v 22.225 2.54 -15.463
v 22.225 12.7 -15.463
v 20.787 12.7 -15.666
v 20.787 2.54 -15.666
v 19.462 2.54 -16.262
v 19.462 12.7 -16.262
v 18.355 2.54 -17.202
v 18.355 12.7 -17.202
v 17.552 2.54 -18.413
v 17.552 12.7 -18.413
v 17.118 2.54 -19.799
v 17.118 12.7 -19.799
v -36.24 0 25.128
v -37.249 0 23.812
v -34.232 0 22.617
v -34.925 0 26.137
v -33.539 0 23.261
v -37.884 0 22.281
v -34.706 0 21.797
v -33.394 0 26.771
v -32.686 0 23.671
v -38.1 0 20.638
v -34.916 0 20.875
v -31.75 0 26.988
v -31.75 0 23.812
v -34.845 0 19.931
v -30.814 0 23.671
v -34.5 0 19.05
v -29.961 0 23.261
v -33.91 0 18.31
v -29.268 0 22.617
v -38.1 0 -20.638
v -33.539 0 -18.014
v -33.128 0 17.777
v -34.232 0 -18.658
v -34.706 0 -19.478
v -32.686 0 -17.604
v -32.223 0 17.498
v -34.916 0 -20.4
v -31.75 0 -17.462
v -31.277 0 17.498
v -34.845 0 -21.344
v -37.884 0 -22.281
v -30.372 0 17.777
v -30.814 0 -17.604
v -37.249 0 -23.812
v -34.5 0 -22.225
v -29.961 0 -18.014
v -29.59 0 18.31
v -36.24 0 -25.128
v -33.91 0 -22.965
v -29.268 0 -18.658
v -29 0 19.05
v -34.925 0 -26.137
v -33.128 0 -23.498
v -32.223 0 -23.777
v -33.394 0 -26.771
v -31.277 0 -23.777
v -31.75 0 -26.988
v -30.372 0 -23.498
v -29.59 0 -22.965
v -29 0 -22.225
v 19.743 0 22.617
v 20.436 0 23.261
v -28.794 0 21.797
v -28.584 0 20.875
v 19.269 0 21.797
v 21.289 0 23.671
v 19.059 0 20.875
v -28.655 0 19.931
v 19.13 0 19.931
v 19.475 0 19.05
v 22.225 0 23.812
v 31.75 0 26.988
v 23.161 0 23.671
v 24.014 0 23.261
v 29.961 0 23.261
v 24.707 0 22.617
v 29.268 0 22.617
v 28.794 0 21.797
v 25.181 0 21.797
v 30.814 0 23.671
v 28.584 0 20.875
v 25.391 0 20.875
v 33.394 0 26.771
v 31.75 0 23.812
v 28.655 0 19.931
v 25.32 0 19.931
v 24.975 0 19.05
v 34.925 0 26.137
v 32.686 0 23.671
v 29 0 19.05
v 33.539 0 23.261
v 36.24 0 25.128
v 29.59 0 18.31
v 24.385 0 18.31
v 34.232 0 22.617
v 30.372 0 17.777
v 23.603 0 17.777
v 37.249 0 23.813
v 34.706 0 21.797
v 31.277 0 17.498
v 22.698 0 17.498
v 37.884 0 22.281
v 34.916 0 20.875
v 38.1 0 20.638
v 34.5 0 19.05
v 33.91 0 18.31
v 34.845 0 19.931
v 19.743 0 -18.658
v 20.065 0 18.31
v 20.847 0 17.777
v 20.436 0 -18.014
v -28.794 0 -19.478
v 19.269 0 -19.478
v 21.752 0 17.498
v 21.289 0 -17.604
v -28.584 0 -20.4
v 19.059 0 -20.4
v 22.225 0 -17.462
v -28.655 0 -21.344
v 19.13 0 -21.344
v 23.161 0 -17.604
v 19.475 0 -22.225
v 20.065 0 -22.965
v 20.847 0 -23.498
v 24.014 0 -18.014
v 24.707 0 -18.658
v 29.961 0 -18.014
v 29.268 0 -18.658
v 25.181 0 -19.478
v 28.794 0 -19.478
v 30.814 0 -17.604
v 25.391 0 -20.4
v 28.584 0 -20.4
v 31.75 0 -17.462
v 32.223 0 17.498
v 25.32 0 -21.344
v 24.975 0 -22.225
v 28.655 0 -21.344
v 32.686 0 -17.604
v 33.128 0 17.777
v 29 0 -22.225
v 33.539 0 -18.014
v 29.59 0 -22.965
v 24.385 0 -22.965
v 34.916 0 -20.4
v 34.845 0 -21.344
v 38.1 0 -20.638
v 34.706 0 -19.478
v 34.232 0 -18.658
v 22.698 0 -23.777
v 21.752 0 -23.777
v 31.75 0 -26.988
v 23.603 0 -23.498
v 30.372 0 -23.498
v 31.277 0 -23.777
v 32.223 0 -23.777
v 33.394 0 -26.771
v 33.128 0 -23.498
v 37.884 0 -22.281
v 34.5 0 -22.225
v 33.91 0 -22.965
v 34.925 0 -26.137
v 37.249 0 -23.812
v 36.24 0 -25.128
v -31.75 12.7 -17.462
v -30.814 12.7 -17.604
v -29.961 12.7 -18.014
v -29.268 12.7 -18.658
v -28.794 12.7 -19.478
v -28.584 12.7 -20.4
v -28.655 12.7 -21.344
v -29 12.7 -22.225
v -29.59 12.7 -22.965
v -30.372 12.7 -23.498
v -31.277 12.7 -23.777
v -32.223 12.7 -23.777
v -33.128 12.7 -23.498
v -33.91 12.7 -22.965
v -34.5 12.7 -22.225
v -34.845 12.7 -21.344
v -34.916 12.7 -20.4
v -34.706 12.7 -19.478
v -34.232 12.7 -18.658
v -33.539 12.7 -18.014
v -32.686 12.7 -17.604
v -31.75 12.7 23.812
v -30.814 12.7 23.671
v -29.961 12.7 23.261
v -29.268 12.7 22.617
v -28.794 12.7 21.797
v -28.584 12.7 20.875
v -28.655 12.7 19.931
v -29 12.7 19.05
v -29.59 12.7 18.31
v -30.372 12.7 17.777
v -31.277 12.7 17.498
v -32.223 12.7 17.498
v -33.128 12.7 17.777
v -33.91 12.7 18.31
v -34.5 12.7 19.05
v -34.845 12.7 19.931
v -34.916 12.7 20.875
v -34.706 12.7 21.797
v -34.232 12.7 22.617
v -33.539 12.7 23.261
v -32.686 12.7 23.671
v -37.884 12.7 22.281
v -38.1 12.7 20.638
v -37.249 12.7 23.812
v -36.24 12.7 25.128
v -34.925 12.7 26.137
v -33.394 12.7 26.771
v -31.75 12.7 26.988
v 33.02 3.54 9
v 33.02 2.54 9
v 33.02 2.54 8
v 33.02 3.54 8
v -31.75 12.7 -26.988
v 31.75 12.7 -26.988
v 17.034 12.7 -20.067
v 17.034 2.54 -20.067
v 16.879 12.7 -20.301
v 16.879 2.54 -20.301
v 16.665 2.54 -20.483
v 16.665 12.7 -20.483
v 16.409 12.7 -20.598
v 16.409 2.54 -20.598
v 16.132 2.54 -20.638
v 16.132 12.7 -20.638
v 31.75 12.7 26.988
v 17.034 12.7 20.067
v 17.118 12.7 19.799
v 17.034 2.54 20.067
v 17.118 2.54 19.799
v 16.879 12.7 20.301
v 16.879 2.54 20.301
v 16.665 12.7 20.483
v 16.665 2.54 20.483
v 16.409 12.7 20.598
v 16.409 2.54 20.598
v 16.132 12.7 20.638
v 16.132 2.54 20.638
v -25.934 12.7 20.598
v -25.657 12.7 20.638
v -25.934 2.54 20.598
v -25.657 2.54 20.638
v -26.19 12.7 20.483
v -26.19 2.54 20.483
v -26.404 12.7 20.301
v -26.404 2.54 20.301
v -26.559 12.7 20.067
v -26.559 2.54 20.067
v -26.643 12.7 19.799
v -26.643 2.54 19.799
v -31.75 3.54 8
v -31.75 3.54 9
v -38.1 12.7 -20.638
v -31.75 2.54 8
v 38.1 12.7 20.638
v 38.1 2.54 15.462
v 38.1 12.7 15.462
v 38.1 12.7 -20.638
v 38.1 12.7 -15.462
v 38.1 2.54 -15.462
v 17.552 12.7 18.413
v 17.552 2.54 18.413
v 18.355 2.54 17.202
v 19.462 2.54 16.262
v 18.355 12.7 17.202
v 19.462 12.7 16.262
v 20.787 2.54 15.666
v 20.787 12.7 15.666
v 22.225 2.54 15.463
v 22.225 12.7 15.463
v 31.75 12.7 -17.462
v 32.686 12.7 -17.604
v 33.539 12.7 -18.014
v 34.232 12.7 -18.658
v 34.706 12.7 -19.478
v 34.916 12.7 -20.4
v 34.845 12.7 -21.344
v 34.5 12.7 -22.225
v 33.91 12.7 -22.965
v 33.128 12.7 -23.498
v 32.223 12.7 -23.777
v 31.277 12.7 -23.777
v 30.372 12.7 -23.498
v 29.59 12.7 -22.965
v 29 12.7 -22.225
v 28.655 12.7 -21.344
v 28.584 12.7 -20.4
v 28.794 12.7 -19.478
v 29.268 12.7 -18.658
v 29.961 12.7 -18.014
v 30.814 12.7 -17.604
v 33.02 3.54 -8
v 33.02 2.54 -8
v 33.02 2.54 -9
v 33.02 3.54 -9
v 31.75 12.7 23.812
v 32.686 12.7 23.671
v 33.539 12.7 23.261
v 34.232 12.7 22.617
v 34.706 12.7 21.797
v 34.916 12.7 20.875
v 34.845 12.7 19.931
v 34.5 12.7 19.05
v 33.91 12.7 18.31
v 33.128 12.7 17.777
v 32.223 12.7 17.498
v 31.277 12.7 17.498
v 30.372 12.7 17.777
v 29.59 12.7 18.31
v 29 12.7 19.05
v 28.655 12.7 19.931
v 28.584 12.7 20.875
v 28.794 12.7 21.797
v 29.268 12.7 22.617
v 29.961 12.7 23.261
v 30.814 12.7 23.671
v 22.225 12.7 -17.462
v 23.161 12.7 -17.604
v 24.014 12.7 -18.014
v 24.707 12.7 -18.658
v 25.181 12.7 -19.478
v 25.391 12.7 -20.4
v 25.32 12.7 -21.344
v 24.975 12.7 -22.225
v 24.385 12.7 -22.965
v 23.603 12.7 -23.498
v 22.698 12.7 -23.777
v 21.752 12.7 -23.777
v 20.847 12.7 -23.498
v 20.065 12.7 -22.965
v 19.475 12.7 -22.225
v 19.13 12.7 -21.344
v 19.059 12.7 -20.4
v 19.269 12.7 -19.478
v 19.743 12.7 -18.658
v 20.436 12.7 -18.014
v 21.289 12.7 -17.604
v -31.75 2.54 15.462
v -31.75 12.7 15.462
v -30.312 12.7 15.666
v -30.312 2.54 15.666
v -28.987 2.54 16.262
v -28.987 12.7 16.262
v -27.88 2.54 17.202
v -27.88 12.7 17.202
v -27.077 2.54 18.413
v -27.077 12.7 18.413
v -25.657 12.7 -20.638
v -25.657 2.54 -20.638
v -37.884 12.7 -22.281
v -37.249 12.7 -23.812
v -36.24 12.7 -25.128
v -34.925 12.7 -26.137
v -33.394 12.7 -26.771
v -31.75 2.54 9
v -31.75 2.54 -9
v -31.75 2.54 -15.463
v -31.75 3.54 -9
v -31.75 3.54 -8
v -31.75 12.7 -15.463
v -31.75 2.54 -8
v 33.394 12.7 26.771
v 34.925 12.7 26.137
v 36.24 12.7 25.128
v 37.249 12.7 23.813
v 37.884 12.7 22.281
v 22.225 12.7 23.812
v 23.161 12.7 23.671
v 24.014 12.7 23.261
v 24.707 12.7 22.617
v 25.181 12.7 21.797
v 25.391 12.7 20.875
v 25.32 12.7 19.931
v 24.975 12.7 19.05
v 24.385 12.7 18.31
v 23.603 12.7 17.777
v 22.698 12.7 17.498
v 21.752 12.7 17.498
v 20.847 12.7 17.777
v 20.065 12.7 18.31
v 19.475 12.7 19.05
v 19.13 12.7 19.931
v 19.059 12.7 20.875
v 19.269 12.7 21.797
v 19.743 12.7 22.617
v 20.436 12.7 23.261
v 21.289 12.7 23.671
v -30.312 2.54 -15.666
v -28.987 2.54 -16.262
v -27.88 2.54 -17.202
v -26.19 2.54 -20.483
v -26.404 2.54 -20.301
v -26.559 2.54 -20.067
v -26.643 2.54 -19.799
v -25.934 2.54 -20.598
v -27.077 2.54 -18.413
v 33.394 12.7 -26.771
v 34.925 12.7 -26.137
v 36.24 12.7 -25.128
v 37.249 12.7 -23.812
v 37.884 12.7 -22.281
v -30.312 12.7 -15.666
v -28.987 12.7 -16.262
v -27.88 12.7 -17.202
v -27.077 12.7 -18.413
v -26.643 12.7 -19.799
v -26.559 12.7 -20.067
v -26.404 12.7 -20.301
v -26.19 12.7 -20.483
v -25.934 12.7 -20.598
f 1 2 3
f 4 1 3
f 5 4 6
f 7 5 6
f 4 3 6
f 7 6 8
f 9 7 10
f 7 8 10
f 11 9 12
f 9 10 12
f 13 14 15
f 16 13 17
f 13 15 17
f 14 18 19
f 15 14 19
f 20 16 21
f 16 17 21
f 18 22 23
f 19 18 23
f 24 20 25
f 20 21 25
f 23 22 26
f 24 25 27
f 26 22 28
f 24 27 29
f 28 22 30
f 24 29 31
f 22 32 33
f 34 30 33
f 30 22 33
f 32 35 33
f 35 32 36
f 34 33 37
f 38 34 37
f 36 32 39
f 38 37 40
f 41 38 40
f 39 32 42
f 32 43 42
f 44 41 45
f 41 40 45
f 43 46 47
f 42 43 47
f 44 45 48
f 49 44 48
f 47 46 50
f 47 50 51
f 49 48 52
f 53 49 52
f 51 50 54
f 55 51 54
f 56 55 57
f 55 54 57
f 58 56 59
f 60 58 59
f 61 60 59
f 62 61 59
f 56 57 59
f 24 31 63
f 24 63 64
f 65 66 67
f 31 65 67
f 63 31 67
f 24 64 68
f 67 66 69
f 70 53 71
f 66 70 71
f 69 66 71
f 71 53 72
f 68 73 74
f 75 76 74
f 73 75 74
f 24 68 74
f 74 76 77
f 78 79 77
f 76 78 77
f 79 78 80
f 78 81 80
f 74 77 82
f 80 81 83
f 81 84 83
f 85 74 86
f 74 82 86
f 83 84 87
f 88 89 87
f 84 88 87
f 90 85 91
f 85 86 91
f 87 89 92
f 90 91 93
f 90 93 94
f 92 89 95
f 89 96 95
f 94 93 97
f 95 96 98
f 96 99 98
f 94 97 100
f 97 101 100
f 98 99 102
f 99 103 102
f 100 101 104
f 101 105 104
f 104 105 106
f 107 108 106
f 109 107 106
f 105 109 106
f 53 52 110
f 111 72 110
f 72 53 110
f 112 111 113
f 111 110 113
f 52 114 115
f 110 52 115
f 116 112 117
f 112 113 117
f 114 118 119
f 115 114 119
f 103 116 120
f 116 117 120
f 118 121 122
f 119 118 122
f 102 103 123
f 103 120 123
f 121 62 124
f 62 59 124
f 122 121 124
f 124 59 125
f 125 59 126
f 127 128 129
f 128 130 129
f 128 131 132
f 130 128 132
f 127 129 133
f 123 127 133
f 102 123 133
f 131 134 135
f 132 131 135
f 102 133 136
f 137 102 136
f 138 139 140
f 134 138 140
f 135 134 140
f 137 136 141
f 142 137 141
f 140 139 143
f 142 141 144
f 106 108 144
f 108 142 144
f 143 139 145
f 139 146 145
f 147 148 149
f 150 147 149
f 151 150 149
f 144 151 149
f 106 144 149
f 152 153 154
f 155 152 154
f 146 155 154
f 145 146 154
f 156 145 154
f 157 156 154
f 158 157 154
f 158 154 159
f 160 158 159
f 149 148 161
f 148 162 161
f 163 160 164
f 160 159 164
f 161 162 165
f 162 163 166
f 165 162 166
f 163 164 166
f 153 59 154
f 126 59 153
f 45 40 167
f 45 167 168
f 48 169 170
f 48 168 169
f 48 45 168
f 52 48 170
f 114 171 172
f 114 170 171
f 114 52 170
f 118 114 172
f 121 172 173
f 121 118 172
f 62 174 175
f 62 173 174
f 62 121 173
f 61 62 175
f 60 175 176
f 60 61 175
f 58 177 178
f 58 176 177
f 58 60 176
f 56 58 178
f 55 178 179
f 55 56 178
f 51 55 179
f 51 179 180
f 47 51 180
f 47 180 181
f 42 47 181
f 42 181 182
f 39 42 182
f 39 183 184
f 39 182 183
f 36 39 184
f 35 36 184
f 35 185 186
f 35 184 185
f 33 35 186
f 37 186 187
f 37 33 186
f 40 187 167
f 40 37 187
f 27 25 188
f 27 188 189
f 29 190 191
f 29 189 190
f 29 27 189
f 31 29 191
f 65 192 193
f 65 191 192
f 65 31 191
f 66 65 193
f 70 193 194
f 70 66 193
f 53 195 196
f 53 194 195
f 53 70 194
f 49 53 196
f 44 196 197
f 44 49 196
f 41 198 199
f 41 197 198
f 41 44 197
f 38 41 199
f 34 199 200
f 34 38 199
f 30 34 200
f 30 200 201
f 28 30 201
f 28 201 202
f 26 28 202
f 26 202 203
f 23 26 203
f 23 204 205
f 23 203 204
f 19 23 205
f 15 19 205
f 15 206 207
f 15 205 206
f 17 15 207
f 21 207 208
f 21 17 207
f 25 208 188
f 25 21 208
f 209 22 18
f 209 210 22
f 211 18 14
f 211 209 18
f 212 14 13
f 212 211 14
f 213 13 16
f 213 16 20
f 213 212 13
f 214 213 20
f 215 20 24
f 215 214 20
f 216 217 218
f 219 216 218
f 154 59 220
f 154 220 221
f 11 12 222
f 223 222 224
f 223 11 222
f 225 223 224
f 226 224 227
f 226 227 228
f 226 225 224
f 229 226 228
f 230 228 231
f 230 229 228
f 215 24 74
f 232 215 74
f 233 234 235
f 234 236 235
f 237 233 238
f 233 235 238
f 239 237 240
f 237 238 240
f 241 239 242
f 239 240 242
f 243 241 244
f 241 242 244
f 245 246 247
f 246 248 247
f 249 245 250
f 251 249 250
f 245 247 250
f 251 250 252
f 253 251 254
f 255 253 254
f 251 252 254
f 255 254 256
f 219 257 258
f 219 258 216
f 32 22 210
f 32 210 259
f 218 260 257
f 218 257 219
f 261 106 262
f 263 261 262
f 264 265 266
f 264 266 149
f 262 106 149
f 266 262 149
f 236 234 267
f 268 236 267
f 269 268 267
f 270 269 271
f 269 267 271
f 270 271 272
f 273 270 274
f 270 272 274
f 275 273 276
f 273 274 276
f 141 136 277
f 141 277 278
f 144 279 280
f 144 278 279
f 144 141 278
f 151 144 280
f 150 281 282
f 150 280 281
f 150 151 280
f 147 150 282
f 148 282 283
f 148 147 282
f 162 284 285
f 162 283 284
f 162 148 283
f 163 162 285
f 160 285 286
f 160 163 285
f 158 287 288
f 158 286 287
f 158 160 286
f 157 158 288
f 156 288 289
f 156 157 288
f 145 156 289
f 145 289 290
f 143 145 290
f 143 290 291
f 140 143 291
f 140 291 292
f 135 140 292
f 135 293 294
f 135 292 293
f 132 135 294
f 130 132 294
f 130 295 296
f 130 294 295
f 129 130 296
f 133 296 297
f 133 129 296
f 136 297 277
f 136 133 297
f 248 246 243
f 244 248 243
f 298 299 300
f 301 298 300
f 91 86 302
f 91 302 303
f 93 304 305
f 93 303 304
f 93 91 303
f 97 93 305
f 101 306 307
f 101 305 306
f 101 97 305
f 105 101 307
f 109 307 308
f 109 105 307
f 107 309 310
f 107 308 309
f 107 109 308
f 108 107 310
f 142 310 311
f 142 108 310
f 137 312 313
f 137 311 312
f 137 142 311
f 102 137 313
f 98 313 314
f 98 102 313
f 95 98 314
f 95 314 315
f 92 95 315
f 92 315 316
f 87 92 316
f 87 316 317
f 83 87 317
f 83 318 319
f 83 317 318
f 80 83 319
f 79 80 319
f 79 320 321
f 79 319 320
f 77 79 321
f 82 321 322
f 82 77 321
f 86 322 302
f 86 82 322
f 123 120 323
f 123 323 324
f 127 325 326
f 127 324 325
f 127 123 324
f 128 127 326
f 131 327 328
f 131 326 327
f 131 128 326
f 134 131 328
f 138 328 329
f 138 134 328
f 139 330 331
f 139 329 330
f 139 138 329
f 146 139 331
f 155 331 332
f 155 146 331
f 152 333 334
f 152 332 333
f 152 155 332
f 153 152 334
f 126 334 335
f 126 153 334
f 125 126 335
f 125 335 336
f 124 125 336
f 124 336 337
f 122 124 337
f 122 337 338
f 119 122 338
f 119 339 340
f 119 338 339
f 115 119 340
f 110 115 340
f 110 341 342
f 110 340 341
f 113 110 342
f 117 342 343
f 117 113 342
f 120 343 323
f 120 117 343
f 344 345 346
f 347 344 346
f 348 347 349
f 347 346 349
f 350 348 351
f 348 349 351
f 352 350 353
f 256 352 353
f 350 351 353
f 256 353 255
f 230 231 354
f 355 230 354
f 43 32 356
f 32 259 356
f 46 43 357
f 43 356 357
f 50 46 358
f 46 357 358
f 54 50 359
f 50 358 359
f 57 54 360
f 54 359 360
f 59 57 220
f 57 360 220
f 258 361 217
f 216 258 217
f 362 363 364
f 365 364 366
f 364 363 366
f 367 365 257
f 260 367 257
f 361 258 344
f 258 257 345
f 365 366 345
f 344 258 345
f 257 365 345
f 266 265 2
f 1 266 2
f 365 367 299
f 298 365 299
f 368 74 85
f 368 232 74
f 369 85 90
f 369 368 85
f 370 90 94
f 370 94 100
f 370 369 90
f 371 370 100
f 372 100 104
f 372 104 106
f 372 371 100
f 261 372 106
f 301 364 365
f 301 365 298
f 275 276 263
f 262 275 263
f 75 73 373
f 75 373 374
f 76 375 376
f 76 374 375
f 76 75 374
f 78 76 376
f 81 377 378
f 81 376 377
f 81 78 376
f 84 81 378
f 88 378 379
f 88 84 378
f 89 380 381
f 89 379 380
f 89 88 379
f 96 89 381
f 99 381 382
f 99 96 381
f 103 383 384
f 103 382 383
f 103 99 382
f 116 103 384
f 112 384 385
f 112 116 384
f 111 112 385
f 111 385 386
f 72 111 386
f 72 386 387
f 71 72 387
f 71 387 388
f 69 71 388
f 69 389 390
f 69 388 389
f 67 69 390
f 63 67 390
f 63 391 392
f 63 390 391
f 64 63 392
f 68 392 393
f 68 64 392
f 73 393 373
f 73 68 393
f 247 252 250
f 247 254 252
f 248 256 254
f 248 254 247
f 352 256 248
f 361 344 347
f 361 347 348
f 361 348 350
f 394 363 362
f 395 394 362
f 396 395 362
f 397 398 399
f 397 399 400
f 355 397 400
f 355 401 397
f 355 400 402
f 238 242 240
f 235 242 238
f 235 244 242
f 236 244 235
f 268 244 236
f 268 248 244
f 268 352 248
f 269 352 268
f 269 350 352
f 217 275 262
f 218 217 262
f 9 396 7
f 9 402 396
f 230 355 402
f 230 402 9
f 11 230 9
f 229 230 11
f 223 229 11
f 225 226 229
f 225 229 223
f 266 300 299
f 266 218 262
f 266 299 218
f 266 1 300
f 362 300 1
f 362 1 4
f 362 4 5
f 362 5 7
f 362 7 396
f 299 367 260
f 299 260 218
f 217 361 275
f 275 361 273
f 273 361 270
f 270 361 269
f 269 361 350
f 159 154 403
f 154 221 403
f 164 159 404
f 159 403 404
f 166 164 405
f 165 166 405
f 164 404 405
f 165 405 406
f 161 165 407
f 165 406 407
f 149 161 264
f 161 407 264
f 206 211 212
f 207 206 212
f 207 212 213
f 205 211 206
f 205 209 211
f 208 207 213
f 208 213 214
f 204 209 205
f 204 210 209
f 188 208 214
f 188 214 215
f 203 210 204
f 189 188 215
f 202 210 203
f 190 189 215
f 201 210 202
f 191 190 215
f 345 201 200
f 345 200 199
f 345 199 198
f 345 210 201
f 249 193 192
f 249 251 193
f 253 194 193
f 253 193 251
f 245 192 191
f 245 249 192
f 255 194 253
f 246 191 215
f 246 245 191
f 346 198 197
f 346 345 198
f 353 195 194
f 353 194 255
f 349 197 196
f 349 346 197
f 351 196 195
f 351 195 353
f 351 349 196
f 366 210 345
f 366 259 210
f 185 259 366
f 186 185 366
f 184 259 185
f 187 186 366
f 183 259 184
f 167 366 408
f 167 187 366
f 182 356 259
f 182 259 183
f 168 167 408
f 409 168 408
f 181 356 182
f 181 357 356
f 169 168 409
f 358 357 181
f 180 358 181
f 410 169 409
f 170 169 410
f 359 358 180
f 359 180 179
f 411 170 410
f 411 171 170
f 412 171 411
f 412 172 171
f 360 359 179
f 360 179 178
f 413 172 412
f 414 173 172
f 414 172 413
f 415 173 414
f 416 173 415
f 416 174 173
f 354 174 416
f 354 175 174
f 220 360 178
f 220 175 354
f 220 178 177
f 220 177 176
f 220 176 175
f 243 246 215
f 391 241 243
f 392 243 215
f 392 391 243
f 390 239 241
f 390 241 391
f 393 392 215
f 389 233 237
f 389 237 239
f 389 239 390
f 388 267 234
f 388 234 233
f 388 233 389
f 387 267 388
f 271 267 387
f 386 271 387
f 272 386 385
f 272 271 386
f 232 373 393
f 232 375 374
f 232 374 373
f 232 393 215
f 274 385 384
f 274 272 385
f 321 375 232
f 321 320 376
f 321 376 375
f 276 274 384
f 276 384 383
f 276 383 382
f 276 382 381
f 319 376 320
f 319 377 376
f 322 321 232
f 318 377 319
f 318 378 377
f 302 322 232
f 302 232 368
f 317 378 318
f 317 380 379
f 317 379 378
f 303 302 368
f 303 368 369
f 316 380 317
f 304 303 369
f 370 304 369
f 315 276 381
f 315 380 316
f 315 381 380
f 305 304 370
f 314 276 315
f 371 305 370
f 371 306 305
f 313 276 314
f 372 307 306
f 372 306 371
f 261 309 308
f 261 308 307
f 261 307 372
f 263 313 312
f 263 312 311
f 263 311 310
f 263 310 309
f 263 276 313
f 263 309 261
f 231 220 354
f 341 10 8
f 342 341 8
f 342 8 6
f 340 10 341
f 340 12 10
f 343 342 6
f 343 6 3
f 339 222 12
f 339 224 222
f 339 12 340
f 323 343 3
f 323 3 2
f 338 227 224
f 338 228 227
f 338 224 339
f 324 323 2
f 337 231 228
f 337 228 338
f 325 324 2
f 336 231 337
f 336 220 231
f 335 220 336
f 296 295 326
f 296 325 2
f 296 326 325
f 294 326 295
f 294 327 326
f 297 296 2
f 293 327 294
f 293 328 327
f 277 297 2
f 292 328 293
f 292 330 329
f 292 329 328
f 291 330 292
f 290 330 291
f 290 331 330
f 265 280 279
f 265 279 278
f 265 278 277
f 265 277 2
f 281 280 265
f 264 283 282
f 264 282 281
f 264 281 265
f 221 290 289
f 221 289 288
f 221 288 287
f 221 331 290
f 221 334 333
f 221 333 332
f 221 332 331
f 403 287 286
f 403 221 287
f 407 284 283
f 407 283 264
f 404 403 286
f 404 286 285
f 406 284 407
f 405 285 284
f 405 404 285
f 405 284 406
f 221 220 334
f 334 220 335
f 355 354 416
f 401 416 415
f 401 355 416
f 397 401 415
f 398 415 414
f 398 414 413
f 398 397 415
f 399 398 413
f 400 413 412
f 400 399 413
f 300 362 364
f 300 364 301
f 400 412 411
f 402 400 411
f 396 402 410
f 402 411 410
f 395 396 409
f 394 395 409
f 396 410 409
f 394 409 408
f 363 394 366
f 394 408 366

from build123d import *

# Parameters (mm, degrees)
MAIN_BODY_SKETCH_W        = 76.2
MAIN_BODY_SKETCH_H        = 53.975
MAIN_BODY_DEPTH           = 12.7
MOUNTING_HOLES_DEPTH      = 49.386208327
MOUNTING_HOLES_DEPTH_BACK = 49.386208327
MOUNTING_HOLES_SKETCH_R   = 3.175
MAIN_CUTOUT_DEPTH         = 10.16
RIB_SKETCH_W              = 64.77
RIB_SKETCH_H              = 1
RIB_DEPTH                 = 1
OUTER_CORNER_FILLET_R     = 6.35
INNER_CORNER_FILLET_R     = 1


with BuildPart() as part:
    # Main Body Sketch → Main Body (new body)
    with BuildSketch(Plane(origin=(0, 0, 0), x_dir=(1, 0, 0), z_dir=(0, 1, 0))):
        Rectangle(MAIN_BODY_SKETCH_W, MAIN_BODY_SKETCH_H)
    extrude(amount=MAIN_BODY_DEPTH)

    # Mounting Holes Sketch → Mounting Holes (cut, two sides: drawn at the far end of the back side and taken through both)
    with BuildSketch(Plane(origin=(0, 12.7, 0), x_dir=(1, 0, 0), z_dir=(0, 1, 0)).offset(-MOUNTING_HOLES_DEPTH_BACK)):
        with Locations(Location((31.75, -20.6375, 0), (0, 0, 270))):
            Circle(MOUNTING_HOLES_SKETCH_R)
        with Locations(Location((22.225, -20.6375, 0), (0, 0, 270))):
            Circle(MOUNTING_HOLES_SKETCH_R)
        with Locations(Location((-31.75, -20.6375, 0), (0, 0, 270))):
            Circle(MOUNTING_HOLES_SKETCH_R)
        with Locations(Location((31.75, 20.6375, 0), (0, 0, 270))):
            Circle(MOUNTING_HOLES_SKETCH_R)
        with Locations(Location((22.225, 20.6375, 0), (0, 0, 270))):
            Circle(MOUNTING_HOLES_SKETCH_R)
        with Locations(Location((-31.75, 20.6375, 0), (0, 0, 270))):
            Circle(MOUNTING_HOLES_SKETCH_R)
    extrude(amount=MOUNTING_HOLES_DEPTH + MOUNTING_HOLES_DEPTH_BACK, mode=Mode.SUBTRACT)

    # Main Cutout Sketch → Main Cutout (cut)
    with BuildSketch(Plane(origin=(0, 12.7, 0), x_dir=(1, 0, 0), z_dir=(0, 1, 0))):
        with BuildLine():
            Line((31.75, -15.4625), (38.1, -15.4625))
            Line((38.1, -15.4625), (38.1, 15.4625))
            Line((38.1, 15.4625), (22.225, 15.4625))
            ThreePointArc((22.225, 15.4625), (18.565722407, 16.978222407), (17.05, 20.6375))
            Line((17.05, 20.6375), (-26.575, 20.6375))
            ThreePointArc((-26.575, 20.6375), (-28.090722407, 16.978222407), (-31.75, 15.4625))
            Line((-31.75, 15.4625), (-31.75, -15.4625))
            ThreePointArc((-31.75, -15.4625), (-28.090722407, -16.978222407), (-26.575, -20.6375))
            Line((-26.575, -20.6375), (17.05, -20.6375))
            ThreePointArc((17.05, -20.6375), (18.565722407, -16.978222407), (22.225, -15.4625))
            Line((22.225, -15.4625), (31.75, -15.4625))
        make_face()
    extrude(amount=-MAIN_CUTOUT_DEPTH, mode=Mode.SUBTRACT)

    # Rib Sketch → Rib (add)
    with BuildSketch(Plane(origin=(0, 2.54, 0), x_dir=(1, 0, 0), z_dir=(0, 1, 0))):
        with Locations((0.635, -8.5)):
            Rectangle(RIB_SKETCH_W, RIB_SKETCH_H)
        with Locations((0.635, 8.5)):
            Rectangle(RIB_SKETCH_W, RIB_SKETCH_H)
    extrude(amount=RIB_DEPTH)

    # Outer Corner Fillet
    outer_corner_fillet_edges = [part.edges().sort_by_distance(p)[0] for p in [
        (-38.1, 6.35, -26.9875),
        (38.1, 6.35, -26.9875),
        (38.1, 6.35, 26.9875),
        (-38.1, 6.35, 26.9875),
    ]]
    fillet(outer_corner_fillet_edges, radius=OUTER_CORNER_FILLET_R)

    # Inner Corner Fillet
    inner_corner_fillet_edges = [part.edges().sort_by_distance(p)[0] for p in [
        (17.05, 7.62, -20.6375),
        (-26.575, 7.62, -20.6375),
        (-26.575, 7.62, 20.6375),
        (17.05, 7.62, 20.6375),
    ]]
    fillet(inner_corner_fillet_edges, radius=INNER_CORNER_FILLET_R)


solid = part.part
